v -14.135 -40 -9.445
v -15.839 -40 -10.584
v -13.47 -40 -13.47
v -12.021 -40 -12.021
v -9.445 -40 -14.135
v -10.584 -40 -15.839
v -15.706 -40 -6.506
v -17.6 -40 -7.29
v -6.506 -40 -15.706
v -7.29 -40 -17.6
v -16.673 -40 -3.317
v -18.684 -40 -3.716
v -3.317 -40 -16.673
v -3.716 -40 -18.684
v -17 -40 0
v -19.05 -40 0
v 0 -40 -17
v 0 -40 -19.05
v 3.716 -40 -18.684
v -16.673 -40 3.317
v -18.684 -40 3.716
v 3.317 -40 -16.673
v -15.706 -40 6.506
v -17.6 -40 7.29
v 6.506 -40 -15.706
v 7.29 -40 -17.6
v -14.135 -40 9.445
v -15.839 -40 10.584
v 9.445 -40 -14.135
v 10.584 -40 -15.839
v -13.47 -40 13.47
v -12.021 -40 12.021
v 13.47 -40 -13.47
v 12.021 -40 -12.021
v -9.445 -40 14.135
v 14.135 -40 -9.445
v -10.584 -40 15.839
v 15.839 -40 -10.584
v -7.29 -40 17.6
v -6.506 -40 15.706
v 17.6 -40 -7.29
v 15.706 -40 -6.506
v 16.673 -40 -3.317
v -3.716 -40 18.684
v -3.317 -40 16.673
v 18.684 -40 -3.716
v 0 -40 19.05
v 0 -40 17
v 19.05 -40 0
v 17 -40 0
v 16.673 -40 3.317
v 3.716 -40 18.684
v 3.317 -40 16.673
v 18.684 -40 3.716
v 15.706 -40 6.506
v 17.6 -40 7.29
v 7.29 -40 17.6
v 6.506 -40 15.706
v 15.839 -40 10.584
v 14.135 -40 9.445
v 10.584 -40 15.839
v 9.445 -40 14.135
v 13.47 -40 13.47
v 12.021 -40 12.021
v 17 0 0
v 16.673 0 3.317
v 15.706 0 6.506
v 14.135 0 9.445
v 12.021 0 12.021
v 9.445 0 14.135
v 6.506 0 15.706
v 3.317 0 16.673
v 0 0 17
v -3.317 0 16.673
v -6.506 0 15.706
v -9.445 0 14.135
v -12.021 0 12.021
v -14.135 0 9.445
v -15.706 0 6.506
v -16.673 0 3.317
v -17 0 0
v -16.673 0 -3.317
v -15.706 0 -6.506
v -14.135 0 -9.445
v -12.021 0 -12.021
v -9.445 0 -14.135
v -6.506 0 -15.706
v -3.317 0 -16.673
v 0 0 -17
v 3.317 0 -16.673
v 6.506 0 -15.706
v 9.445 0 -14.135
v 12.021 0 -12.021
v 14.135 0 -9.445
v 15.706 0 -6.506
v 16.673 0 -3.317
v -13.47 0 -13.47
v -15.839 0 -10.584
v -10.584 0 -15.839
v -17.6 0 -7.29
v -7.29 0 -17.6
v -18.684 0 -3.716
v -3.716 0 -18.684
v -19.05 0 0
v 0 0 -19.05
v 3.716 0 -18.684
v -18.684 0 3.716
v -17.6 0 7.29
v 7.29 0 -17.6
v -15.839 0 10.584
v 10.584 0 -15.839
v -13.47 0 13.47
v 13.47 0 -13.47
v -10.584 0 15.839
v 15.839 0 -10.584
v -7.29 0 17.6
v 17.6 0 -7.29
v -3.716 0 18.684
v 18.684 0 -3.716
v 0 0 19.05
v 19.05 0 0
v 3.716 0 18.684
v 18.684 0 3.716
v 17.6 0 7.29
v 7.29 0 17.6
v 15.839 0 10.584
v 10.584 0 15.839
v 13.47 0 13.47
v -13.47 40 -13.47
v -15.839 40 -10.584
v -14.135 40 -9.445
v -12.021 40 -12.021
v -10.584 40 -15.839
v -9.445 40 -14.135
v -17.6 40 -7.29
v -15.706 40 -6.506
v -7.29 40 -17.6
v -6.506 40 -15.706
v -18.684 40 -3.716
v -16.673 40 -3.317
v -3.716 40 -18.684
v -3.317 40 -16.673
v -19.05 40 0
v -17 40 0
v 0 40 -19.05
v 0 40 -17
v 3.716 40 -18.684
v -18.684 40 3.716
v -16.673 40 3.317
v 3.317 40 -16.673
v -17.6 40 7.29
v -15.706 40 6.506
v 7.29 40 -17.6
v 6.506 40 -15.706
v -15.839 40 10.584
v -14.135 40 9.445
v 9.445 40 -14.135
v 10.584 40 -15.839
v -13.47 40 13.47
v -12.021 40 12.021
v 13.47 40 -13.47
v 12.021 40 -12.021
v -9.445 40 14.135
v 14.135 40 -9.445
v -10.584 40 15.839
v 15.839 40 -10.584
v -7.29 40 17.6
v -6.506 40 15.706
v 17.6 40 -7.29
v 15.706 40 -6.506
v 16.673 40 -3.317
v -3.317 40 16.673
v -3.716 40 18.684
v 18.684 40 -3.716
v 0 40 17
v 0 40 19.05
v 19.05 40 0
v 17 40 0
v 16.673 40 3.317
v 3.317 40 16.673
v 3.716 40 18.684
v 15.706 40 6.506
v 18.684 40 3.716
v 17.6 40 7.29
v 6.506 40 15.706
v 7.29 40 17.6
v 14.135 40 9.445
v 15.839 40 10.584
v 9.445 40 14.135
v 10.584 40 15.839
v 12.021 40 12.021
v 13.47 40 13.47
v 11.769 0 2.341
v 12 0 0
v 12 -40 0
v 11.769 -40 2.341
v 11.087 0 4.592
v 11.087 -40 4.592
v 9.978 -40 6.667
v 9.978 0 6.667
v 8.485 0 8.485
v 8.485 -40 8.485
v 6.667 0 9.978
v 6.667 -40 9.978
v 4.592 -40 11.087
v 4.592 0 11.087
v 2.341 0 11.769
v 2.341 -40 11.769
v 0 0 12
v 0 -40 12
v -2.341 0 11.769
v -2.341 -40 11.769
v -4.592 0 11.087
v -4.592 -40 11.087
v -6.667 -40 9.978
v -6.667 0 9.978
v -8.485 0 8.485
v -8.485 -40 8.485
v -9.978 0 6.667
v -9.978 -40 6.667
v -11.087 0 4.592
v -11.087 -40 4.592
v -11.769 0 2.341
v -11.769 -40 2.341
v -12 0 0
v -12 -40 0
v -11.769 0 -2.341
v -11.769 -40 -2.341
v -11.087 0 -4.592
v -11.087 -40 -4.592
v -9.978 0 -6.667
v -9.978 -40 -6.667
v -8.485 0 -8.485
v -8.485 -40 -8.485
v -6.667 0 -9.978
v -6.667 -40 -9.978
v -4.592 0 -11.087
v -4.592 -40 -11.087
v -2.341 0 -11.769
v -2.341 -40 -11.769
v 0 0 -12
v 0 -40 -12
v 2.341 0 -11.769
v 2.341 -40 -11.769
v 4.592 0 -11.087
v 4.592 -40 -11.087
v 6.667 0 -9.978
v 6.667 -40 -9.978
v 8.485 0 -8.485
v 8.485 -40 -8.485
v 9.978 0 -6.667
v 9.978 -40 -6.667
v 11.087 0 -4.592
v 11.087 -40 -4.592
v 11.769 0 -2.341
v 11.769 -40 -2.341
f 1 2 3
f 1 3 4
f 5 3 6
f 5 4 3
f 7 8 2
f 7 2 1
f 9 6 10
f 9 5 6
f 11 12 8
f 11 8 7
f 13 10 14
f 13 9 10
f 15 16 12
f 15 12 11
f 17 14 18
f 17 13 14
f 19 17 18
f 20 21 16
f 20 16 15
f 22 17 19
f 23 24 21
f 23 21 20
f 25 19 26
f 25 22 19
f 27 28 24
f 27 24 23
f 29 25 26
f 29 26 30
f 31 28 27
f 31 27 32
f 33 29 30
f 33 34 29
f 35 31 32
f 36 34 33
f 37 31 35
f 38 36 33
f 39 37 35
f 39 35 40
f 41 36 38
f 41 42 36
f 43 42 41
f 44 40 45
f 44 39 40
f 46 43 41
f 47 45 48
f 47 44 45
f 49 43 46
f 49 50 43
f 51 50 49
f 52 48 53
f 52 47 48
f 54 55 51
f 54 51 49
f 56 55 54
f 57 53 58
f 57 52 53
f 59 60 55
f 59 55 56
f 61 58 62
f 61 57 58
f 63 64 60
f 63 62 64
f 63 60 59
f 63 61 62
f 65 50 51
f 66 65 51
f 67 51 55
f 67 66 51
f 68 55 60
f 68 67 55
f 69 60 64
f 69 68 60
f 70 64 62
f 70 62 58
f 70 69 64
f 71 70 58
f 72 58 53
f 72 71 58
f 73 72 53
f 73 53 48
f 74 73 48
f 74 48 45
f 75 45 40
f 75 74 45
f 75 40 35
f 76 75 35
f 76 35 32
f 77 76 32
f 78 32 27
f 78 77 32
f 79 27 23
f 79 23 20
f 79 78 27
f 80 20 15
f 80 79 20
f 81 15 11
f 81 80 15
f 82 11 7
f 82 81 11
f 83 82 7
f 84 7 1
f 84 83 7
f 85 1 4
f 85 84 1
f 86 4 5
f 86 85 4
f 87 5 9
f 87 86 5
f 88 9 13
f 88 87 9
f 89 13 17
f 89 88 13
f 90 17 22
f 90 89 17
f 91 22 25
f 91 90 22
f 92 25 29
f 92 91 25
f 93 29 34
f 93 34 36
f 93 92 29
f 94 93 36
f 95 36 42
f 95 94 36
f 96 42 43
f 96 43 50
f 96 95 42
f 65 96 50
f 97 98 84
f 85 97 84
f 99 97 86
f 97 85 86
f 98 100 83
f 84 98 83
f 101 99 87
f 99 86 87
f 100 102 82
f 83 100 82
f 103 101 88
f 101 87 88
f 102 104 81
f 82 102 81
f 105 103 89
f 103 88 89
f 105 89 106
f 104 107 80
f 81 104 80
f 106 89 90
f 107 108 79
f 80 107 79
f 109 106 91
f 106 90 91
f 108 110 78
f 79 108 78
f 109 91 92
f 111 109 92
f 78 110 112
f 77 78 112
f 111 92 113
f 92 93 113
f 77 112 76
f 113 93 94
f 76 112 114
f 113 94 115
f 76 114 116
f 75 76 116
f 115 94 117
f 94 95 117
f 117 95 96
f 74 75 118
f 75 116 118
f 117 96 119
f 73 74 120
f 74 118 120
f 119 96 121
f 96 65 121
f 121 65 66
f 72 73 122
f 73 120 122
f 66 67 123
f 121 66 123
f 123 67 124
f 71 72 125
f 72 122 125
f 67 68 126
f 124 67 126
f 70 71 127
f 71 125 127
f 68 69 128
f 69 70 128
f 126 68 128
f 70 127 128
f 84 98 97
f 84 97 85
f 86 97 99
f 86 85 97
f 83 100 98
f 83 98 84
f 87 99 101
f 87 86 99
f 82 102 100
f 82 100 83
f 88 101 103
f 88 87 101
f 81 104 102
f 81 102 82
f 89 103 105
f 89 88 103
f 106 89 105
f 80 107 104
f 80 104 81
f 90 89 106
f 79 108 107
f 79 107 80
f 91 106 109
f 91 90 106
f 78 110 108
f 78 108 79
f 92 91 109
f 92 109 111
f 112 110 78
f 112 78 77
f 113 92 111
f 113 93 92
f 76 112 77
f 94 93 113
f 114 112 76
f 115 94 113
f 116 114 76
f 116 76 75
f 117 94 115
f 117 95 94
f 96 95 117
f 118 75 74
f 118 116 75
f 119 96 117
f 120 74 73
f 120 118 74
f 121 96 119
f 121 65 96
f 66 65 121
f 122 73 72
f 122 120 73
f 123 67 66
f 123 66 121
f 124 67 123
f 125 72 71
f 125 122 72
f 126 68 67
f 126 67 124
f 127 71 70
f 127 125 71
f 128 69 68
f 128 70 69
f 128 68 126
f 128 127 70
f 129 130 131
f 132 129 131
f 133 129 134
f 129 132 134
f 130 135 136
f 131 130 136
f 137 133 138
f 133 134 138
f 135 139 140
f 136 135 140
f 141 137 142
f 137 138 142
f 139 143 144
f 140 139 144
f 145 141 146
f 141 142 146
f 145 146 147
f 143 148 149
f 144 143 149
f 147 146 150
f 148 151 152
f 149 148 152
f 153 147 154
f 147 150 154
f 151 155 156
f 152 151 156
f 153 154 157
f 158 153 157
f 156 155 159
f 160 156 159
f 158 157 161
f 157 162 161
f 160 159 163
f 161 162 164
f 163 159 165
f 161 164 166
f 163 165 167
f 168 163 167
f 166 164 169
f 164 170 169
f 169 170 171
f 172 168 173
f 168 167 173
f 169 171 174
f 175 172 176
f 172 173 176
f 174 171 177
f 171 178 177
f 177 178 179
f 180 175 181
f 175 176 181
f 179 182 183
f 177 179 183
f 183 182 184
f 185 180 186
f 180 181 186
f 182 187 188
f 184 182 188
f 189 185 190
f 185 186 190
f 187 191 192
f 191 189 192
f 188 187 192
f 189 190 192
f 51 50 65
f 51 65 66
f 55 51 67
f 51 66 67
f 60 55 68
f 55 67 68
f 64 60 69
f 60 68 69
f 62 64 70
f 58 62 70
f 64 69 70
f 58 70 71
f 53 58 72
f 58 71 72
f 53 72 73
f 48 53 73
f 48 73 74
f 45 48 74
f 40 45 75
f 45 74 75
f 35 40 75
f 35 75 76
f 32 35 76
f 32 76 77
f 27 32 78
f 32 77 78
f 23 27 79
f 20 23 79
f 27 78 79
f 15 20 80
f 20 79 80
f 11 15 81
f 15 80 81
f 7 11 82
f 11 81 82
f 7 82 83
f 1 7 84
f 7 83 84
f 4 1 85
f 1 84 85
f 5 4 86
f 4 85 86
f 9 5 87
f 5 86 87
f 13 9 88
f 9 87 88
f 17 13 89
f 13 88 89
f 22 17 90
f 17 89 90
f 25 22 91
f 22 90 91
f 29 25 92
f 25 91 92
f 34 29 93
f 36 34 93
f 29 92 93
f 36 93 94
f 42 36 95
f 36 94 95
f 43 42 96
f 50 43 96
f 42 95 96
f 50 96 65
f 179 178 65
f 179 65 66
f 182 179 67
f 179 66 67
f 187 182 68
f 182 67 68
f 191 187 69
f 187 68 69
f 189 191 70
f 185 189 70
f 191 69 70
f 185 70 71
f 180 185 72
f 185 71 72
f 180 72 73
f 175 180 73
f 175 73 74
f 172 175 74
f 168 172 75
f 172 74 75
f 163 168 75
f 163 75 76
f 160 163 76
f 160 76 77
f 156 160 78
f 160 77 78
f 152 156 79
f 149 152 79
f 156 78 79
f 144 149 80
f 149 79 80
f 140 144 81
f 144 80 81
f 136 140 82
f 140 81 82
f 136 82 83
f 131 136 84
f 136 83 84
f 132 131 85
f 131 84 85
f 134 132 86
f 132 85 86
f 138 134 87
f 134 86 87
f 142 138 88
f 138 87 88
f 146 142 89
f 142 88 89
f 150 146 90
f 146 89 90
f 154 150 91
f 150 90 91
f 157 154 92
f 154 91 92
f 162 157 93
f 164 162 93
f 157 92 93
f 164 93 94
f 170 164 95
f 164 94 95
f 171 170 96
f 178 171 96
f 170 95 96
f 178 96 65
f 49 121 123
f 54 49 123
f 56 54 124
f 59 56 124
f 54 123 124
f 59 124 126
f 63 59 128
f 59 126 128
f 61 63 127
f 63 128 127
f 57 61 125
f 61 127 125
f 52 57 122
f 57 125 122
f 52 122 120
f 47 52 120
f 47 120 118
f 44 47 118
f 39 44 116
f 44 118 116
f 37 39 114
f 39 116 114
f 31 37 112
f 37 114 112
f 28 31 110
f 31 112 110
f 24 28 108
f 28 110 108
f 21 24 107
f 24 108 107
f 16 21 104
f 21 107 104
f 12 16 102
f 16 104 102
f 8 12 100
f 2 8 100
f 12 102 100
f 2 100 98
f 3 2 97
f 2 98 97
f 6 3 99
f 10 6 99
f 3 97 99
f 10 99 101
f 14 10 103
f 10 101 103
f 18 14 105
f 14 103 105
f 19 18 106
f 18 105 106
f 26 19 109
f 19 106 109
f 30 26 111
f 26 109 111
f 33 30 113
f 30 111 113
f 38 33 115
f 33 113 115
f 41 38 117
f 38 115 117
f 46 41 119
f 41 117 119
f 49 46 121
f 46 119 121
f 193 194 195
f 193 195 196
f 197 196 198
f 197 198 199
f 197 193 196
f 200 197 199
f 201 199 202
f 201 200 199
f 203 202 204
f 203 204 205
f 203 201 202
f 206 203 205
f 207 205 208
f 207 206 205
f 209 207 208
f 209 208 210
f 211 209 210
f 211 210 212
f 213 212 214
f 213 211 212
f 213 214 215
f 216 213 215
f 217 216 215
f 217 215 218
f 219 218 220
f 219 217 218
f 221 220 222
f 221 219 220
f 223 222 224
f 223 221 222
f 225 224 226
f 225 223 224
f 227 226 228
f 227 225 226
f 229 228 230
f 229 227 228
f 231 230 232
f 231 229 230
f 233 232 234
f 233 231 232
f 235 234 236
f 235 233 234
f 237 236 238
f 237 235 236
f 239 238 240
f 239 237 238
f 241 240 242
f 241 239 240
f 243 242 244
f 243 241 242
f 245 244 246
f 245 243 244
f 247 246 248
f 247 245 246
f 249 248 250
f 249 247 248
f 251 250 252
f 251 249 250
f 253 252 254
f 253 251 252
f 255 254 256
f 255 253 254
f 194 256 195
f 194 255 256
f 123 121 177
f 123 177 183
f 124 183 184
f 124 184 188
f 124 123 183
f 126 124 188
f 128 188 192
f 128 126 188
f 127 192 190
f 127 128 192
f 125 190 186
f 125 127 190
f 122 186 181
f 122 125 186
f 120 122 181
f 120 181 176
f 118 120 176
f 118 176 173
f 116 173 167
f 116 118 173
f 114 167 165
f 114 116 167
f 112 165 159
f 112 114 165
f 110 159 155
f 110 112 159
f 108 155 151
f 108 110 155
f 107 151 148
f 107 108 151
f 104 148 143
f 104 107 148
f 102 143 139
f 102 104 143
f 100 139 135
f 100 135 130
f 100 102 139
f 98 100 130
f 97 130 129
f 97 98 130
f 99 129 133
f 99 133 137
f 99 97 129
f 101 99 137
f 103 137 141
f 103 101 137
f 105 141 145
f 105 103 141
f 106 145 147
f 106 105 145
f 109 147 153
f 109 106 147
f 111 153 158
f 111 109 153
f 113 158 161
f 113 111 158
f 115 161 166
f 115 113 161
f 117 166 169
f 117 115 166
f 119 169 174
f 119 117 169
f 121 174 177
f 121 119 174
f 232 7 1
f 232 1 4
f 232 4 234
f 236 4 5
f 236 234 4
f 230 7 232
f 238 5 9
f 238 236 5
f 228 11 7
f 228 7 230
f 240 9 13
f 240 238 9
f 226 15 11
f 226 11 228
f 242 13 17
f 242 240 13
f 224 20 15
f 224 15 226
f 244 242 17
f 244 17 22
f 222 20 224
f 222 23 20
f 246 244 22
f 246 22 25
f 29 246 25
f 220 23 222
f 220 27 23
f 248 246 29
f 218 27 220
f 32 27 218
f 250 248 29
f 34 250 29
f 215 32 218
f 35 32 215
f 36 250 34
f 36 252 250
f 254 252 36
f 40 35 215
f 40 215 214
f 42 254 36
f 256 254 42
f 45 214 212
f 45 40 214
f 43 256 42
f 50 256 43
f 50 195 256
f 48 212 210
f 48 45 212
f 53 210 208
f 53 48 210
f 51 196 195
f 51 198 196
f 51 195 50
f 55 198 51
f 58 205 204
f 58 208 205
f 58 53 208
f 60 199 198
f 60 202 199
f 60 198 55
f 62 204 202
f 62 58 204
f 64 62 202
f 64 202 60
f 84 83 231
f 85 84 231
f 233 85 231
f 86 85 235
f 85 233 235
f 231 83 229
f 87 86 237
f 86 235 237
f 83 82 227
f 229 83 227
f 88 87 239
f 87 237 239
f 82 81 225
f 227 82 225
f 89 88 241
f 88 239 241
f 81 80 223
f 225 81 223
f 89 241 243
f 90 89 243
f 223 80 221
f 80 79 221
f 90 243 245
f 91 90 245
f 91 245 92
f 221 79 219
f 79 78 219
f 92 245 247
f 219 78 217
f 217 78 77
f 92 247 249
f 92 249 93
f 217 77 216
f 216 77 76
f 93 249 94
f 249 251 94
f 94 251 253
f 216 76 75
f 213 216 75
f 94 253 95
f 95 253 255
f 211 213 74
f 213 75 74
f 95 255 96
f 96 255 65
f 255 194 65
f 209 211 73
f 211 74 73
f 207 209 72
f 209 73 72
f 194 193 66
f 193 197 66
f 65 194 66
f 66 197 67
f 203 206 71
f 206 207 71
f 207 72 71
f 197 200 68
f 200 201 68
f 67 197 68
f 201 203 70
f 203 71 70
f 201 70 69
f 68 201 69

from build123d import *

# Parameters (mm, degrees)
F0_R     = 17
F0_R_2   = 12
F1_DEPTH = 40
F0_R_3   = 19.05
F2_DEPTH = 40
F3_DEPTH = 40


with BuildPart() as f1:
    # F0 (on Front) → F1 (new body)
    with BuildSketch(Plane.XZ):
        Circle(F0_R)
        Circle(F0_R_2, mode=Mode.SUBTRACT)
    extrude(amount=F1_DEPTH)


with BuildPart() as f2:
    # F0 (on Front) → F2 (new body)
    with BuildSketch(Plane.XZ):
        Circle(F0_R_3)
        Circle(F0_R, mode=Mode.SUBTRACT)
    extrude(amount=-F2_DEPTH)


with BuildPart() as f3:
    # F0 (on Front) → F3 (new body)
    with BuildSketch(Plane.XZ):
        Circle(F0_R_3)
        Circle(F0_R, mode=Mode.SUBTRACT)
    extrude(amount=F3_DEPTH)


solid = Compound([f1.part, f2.part, f3.part])
